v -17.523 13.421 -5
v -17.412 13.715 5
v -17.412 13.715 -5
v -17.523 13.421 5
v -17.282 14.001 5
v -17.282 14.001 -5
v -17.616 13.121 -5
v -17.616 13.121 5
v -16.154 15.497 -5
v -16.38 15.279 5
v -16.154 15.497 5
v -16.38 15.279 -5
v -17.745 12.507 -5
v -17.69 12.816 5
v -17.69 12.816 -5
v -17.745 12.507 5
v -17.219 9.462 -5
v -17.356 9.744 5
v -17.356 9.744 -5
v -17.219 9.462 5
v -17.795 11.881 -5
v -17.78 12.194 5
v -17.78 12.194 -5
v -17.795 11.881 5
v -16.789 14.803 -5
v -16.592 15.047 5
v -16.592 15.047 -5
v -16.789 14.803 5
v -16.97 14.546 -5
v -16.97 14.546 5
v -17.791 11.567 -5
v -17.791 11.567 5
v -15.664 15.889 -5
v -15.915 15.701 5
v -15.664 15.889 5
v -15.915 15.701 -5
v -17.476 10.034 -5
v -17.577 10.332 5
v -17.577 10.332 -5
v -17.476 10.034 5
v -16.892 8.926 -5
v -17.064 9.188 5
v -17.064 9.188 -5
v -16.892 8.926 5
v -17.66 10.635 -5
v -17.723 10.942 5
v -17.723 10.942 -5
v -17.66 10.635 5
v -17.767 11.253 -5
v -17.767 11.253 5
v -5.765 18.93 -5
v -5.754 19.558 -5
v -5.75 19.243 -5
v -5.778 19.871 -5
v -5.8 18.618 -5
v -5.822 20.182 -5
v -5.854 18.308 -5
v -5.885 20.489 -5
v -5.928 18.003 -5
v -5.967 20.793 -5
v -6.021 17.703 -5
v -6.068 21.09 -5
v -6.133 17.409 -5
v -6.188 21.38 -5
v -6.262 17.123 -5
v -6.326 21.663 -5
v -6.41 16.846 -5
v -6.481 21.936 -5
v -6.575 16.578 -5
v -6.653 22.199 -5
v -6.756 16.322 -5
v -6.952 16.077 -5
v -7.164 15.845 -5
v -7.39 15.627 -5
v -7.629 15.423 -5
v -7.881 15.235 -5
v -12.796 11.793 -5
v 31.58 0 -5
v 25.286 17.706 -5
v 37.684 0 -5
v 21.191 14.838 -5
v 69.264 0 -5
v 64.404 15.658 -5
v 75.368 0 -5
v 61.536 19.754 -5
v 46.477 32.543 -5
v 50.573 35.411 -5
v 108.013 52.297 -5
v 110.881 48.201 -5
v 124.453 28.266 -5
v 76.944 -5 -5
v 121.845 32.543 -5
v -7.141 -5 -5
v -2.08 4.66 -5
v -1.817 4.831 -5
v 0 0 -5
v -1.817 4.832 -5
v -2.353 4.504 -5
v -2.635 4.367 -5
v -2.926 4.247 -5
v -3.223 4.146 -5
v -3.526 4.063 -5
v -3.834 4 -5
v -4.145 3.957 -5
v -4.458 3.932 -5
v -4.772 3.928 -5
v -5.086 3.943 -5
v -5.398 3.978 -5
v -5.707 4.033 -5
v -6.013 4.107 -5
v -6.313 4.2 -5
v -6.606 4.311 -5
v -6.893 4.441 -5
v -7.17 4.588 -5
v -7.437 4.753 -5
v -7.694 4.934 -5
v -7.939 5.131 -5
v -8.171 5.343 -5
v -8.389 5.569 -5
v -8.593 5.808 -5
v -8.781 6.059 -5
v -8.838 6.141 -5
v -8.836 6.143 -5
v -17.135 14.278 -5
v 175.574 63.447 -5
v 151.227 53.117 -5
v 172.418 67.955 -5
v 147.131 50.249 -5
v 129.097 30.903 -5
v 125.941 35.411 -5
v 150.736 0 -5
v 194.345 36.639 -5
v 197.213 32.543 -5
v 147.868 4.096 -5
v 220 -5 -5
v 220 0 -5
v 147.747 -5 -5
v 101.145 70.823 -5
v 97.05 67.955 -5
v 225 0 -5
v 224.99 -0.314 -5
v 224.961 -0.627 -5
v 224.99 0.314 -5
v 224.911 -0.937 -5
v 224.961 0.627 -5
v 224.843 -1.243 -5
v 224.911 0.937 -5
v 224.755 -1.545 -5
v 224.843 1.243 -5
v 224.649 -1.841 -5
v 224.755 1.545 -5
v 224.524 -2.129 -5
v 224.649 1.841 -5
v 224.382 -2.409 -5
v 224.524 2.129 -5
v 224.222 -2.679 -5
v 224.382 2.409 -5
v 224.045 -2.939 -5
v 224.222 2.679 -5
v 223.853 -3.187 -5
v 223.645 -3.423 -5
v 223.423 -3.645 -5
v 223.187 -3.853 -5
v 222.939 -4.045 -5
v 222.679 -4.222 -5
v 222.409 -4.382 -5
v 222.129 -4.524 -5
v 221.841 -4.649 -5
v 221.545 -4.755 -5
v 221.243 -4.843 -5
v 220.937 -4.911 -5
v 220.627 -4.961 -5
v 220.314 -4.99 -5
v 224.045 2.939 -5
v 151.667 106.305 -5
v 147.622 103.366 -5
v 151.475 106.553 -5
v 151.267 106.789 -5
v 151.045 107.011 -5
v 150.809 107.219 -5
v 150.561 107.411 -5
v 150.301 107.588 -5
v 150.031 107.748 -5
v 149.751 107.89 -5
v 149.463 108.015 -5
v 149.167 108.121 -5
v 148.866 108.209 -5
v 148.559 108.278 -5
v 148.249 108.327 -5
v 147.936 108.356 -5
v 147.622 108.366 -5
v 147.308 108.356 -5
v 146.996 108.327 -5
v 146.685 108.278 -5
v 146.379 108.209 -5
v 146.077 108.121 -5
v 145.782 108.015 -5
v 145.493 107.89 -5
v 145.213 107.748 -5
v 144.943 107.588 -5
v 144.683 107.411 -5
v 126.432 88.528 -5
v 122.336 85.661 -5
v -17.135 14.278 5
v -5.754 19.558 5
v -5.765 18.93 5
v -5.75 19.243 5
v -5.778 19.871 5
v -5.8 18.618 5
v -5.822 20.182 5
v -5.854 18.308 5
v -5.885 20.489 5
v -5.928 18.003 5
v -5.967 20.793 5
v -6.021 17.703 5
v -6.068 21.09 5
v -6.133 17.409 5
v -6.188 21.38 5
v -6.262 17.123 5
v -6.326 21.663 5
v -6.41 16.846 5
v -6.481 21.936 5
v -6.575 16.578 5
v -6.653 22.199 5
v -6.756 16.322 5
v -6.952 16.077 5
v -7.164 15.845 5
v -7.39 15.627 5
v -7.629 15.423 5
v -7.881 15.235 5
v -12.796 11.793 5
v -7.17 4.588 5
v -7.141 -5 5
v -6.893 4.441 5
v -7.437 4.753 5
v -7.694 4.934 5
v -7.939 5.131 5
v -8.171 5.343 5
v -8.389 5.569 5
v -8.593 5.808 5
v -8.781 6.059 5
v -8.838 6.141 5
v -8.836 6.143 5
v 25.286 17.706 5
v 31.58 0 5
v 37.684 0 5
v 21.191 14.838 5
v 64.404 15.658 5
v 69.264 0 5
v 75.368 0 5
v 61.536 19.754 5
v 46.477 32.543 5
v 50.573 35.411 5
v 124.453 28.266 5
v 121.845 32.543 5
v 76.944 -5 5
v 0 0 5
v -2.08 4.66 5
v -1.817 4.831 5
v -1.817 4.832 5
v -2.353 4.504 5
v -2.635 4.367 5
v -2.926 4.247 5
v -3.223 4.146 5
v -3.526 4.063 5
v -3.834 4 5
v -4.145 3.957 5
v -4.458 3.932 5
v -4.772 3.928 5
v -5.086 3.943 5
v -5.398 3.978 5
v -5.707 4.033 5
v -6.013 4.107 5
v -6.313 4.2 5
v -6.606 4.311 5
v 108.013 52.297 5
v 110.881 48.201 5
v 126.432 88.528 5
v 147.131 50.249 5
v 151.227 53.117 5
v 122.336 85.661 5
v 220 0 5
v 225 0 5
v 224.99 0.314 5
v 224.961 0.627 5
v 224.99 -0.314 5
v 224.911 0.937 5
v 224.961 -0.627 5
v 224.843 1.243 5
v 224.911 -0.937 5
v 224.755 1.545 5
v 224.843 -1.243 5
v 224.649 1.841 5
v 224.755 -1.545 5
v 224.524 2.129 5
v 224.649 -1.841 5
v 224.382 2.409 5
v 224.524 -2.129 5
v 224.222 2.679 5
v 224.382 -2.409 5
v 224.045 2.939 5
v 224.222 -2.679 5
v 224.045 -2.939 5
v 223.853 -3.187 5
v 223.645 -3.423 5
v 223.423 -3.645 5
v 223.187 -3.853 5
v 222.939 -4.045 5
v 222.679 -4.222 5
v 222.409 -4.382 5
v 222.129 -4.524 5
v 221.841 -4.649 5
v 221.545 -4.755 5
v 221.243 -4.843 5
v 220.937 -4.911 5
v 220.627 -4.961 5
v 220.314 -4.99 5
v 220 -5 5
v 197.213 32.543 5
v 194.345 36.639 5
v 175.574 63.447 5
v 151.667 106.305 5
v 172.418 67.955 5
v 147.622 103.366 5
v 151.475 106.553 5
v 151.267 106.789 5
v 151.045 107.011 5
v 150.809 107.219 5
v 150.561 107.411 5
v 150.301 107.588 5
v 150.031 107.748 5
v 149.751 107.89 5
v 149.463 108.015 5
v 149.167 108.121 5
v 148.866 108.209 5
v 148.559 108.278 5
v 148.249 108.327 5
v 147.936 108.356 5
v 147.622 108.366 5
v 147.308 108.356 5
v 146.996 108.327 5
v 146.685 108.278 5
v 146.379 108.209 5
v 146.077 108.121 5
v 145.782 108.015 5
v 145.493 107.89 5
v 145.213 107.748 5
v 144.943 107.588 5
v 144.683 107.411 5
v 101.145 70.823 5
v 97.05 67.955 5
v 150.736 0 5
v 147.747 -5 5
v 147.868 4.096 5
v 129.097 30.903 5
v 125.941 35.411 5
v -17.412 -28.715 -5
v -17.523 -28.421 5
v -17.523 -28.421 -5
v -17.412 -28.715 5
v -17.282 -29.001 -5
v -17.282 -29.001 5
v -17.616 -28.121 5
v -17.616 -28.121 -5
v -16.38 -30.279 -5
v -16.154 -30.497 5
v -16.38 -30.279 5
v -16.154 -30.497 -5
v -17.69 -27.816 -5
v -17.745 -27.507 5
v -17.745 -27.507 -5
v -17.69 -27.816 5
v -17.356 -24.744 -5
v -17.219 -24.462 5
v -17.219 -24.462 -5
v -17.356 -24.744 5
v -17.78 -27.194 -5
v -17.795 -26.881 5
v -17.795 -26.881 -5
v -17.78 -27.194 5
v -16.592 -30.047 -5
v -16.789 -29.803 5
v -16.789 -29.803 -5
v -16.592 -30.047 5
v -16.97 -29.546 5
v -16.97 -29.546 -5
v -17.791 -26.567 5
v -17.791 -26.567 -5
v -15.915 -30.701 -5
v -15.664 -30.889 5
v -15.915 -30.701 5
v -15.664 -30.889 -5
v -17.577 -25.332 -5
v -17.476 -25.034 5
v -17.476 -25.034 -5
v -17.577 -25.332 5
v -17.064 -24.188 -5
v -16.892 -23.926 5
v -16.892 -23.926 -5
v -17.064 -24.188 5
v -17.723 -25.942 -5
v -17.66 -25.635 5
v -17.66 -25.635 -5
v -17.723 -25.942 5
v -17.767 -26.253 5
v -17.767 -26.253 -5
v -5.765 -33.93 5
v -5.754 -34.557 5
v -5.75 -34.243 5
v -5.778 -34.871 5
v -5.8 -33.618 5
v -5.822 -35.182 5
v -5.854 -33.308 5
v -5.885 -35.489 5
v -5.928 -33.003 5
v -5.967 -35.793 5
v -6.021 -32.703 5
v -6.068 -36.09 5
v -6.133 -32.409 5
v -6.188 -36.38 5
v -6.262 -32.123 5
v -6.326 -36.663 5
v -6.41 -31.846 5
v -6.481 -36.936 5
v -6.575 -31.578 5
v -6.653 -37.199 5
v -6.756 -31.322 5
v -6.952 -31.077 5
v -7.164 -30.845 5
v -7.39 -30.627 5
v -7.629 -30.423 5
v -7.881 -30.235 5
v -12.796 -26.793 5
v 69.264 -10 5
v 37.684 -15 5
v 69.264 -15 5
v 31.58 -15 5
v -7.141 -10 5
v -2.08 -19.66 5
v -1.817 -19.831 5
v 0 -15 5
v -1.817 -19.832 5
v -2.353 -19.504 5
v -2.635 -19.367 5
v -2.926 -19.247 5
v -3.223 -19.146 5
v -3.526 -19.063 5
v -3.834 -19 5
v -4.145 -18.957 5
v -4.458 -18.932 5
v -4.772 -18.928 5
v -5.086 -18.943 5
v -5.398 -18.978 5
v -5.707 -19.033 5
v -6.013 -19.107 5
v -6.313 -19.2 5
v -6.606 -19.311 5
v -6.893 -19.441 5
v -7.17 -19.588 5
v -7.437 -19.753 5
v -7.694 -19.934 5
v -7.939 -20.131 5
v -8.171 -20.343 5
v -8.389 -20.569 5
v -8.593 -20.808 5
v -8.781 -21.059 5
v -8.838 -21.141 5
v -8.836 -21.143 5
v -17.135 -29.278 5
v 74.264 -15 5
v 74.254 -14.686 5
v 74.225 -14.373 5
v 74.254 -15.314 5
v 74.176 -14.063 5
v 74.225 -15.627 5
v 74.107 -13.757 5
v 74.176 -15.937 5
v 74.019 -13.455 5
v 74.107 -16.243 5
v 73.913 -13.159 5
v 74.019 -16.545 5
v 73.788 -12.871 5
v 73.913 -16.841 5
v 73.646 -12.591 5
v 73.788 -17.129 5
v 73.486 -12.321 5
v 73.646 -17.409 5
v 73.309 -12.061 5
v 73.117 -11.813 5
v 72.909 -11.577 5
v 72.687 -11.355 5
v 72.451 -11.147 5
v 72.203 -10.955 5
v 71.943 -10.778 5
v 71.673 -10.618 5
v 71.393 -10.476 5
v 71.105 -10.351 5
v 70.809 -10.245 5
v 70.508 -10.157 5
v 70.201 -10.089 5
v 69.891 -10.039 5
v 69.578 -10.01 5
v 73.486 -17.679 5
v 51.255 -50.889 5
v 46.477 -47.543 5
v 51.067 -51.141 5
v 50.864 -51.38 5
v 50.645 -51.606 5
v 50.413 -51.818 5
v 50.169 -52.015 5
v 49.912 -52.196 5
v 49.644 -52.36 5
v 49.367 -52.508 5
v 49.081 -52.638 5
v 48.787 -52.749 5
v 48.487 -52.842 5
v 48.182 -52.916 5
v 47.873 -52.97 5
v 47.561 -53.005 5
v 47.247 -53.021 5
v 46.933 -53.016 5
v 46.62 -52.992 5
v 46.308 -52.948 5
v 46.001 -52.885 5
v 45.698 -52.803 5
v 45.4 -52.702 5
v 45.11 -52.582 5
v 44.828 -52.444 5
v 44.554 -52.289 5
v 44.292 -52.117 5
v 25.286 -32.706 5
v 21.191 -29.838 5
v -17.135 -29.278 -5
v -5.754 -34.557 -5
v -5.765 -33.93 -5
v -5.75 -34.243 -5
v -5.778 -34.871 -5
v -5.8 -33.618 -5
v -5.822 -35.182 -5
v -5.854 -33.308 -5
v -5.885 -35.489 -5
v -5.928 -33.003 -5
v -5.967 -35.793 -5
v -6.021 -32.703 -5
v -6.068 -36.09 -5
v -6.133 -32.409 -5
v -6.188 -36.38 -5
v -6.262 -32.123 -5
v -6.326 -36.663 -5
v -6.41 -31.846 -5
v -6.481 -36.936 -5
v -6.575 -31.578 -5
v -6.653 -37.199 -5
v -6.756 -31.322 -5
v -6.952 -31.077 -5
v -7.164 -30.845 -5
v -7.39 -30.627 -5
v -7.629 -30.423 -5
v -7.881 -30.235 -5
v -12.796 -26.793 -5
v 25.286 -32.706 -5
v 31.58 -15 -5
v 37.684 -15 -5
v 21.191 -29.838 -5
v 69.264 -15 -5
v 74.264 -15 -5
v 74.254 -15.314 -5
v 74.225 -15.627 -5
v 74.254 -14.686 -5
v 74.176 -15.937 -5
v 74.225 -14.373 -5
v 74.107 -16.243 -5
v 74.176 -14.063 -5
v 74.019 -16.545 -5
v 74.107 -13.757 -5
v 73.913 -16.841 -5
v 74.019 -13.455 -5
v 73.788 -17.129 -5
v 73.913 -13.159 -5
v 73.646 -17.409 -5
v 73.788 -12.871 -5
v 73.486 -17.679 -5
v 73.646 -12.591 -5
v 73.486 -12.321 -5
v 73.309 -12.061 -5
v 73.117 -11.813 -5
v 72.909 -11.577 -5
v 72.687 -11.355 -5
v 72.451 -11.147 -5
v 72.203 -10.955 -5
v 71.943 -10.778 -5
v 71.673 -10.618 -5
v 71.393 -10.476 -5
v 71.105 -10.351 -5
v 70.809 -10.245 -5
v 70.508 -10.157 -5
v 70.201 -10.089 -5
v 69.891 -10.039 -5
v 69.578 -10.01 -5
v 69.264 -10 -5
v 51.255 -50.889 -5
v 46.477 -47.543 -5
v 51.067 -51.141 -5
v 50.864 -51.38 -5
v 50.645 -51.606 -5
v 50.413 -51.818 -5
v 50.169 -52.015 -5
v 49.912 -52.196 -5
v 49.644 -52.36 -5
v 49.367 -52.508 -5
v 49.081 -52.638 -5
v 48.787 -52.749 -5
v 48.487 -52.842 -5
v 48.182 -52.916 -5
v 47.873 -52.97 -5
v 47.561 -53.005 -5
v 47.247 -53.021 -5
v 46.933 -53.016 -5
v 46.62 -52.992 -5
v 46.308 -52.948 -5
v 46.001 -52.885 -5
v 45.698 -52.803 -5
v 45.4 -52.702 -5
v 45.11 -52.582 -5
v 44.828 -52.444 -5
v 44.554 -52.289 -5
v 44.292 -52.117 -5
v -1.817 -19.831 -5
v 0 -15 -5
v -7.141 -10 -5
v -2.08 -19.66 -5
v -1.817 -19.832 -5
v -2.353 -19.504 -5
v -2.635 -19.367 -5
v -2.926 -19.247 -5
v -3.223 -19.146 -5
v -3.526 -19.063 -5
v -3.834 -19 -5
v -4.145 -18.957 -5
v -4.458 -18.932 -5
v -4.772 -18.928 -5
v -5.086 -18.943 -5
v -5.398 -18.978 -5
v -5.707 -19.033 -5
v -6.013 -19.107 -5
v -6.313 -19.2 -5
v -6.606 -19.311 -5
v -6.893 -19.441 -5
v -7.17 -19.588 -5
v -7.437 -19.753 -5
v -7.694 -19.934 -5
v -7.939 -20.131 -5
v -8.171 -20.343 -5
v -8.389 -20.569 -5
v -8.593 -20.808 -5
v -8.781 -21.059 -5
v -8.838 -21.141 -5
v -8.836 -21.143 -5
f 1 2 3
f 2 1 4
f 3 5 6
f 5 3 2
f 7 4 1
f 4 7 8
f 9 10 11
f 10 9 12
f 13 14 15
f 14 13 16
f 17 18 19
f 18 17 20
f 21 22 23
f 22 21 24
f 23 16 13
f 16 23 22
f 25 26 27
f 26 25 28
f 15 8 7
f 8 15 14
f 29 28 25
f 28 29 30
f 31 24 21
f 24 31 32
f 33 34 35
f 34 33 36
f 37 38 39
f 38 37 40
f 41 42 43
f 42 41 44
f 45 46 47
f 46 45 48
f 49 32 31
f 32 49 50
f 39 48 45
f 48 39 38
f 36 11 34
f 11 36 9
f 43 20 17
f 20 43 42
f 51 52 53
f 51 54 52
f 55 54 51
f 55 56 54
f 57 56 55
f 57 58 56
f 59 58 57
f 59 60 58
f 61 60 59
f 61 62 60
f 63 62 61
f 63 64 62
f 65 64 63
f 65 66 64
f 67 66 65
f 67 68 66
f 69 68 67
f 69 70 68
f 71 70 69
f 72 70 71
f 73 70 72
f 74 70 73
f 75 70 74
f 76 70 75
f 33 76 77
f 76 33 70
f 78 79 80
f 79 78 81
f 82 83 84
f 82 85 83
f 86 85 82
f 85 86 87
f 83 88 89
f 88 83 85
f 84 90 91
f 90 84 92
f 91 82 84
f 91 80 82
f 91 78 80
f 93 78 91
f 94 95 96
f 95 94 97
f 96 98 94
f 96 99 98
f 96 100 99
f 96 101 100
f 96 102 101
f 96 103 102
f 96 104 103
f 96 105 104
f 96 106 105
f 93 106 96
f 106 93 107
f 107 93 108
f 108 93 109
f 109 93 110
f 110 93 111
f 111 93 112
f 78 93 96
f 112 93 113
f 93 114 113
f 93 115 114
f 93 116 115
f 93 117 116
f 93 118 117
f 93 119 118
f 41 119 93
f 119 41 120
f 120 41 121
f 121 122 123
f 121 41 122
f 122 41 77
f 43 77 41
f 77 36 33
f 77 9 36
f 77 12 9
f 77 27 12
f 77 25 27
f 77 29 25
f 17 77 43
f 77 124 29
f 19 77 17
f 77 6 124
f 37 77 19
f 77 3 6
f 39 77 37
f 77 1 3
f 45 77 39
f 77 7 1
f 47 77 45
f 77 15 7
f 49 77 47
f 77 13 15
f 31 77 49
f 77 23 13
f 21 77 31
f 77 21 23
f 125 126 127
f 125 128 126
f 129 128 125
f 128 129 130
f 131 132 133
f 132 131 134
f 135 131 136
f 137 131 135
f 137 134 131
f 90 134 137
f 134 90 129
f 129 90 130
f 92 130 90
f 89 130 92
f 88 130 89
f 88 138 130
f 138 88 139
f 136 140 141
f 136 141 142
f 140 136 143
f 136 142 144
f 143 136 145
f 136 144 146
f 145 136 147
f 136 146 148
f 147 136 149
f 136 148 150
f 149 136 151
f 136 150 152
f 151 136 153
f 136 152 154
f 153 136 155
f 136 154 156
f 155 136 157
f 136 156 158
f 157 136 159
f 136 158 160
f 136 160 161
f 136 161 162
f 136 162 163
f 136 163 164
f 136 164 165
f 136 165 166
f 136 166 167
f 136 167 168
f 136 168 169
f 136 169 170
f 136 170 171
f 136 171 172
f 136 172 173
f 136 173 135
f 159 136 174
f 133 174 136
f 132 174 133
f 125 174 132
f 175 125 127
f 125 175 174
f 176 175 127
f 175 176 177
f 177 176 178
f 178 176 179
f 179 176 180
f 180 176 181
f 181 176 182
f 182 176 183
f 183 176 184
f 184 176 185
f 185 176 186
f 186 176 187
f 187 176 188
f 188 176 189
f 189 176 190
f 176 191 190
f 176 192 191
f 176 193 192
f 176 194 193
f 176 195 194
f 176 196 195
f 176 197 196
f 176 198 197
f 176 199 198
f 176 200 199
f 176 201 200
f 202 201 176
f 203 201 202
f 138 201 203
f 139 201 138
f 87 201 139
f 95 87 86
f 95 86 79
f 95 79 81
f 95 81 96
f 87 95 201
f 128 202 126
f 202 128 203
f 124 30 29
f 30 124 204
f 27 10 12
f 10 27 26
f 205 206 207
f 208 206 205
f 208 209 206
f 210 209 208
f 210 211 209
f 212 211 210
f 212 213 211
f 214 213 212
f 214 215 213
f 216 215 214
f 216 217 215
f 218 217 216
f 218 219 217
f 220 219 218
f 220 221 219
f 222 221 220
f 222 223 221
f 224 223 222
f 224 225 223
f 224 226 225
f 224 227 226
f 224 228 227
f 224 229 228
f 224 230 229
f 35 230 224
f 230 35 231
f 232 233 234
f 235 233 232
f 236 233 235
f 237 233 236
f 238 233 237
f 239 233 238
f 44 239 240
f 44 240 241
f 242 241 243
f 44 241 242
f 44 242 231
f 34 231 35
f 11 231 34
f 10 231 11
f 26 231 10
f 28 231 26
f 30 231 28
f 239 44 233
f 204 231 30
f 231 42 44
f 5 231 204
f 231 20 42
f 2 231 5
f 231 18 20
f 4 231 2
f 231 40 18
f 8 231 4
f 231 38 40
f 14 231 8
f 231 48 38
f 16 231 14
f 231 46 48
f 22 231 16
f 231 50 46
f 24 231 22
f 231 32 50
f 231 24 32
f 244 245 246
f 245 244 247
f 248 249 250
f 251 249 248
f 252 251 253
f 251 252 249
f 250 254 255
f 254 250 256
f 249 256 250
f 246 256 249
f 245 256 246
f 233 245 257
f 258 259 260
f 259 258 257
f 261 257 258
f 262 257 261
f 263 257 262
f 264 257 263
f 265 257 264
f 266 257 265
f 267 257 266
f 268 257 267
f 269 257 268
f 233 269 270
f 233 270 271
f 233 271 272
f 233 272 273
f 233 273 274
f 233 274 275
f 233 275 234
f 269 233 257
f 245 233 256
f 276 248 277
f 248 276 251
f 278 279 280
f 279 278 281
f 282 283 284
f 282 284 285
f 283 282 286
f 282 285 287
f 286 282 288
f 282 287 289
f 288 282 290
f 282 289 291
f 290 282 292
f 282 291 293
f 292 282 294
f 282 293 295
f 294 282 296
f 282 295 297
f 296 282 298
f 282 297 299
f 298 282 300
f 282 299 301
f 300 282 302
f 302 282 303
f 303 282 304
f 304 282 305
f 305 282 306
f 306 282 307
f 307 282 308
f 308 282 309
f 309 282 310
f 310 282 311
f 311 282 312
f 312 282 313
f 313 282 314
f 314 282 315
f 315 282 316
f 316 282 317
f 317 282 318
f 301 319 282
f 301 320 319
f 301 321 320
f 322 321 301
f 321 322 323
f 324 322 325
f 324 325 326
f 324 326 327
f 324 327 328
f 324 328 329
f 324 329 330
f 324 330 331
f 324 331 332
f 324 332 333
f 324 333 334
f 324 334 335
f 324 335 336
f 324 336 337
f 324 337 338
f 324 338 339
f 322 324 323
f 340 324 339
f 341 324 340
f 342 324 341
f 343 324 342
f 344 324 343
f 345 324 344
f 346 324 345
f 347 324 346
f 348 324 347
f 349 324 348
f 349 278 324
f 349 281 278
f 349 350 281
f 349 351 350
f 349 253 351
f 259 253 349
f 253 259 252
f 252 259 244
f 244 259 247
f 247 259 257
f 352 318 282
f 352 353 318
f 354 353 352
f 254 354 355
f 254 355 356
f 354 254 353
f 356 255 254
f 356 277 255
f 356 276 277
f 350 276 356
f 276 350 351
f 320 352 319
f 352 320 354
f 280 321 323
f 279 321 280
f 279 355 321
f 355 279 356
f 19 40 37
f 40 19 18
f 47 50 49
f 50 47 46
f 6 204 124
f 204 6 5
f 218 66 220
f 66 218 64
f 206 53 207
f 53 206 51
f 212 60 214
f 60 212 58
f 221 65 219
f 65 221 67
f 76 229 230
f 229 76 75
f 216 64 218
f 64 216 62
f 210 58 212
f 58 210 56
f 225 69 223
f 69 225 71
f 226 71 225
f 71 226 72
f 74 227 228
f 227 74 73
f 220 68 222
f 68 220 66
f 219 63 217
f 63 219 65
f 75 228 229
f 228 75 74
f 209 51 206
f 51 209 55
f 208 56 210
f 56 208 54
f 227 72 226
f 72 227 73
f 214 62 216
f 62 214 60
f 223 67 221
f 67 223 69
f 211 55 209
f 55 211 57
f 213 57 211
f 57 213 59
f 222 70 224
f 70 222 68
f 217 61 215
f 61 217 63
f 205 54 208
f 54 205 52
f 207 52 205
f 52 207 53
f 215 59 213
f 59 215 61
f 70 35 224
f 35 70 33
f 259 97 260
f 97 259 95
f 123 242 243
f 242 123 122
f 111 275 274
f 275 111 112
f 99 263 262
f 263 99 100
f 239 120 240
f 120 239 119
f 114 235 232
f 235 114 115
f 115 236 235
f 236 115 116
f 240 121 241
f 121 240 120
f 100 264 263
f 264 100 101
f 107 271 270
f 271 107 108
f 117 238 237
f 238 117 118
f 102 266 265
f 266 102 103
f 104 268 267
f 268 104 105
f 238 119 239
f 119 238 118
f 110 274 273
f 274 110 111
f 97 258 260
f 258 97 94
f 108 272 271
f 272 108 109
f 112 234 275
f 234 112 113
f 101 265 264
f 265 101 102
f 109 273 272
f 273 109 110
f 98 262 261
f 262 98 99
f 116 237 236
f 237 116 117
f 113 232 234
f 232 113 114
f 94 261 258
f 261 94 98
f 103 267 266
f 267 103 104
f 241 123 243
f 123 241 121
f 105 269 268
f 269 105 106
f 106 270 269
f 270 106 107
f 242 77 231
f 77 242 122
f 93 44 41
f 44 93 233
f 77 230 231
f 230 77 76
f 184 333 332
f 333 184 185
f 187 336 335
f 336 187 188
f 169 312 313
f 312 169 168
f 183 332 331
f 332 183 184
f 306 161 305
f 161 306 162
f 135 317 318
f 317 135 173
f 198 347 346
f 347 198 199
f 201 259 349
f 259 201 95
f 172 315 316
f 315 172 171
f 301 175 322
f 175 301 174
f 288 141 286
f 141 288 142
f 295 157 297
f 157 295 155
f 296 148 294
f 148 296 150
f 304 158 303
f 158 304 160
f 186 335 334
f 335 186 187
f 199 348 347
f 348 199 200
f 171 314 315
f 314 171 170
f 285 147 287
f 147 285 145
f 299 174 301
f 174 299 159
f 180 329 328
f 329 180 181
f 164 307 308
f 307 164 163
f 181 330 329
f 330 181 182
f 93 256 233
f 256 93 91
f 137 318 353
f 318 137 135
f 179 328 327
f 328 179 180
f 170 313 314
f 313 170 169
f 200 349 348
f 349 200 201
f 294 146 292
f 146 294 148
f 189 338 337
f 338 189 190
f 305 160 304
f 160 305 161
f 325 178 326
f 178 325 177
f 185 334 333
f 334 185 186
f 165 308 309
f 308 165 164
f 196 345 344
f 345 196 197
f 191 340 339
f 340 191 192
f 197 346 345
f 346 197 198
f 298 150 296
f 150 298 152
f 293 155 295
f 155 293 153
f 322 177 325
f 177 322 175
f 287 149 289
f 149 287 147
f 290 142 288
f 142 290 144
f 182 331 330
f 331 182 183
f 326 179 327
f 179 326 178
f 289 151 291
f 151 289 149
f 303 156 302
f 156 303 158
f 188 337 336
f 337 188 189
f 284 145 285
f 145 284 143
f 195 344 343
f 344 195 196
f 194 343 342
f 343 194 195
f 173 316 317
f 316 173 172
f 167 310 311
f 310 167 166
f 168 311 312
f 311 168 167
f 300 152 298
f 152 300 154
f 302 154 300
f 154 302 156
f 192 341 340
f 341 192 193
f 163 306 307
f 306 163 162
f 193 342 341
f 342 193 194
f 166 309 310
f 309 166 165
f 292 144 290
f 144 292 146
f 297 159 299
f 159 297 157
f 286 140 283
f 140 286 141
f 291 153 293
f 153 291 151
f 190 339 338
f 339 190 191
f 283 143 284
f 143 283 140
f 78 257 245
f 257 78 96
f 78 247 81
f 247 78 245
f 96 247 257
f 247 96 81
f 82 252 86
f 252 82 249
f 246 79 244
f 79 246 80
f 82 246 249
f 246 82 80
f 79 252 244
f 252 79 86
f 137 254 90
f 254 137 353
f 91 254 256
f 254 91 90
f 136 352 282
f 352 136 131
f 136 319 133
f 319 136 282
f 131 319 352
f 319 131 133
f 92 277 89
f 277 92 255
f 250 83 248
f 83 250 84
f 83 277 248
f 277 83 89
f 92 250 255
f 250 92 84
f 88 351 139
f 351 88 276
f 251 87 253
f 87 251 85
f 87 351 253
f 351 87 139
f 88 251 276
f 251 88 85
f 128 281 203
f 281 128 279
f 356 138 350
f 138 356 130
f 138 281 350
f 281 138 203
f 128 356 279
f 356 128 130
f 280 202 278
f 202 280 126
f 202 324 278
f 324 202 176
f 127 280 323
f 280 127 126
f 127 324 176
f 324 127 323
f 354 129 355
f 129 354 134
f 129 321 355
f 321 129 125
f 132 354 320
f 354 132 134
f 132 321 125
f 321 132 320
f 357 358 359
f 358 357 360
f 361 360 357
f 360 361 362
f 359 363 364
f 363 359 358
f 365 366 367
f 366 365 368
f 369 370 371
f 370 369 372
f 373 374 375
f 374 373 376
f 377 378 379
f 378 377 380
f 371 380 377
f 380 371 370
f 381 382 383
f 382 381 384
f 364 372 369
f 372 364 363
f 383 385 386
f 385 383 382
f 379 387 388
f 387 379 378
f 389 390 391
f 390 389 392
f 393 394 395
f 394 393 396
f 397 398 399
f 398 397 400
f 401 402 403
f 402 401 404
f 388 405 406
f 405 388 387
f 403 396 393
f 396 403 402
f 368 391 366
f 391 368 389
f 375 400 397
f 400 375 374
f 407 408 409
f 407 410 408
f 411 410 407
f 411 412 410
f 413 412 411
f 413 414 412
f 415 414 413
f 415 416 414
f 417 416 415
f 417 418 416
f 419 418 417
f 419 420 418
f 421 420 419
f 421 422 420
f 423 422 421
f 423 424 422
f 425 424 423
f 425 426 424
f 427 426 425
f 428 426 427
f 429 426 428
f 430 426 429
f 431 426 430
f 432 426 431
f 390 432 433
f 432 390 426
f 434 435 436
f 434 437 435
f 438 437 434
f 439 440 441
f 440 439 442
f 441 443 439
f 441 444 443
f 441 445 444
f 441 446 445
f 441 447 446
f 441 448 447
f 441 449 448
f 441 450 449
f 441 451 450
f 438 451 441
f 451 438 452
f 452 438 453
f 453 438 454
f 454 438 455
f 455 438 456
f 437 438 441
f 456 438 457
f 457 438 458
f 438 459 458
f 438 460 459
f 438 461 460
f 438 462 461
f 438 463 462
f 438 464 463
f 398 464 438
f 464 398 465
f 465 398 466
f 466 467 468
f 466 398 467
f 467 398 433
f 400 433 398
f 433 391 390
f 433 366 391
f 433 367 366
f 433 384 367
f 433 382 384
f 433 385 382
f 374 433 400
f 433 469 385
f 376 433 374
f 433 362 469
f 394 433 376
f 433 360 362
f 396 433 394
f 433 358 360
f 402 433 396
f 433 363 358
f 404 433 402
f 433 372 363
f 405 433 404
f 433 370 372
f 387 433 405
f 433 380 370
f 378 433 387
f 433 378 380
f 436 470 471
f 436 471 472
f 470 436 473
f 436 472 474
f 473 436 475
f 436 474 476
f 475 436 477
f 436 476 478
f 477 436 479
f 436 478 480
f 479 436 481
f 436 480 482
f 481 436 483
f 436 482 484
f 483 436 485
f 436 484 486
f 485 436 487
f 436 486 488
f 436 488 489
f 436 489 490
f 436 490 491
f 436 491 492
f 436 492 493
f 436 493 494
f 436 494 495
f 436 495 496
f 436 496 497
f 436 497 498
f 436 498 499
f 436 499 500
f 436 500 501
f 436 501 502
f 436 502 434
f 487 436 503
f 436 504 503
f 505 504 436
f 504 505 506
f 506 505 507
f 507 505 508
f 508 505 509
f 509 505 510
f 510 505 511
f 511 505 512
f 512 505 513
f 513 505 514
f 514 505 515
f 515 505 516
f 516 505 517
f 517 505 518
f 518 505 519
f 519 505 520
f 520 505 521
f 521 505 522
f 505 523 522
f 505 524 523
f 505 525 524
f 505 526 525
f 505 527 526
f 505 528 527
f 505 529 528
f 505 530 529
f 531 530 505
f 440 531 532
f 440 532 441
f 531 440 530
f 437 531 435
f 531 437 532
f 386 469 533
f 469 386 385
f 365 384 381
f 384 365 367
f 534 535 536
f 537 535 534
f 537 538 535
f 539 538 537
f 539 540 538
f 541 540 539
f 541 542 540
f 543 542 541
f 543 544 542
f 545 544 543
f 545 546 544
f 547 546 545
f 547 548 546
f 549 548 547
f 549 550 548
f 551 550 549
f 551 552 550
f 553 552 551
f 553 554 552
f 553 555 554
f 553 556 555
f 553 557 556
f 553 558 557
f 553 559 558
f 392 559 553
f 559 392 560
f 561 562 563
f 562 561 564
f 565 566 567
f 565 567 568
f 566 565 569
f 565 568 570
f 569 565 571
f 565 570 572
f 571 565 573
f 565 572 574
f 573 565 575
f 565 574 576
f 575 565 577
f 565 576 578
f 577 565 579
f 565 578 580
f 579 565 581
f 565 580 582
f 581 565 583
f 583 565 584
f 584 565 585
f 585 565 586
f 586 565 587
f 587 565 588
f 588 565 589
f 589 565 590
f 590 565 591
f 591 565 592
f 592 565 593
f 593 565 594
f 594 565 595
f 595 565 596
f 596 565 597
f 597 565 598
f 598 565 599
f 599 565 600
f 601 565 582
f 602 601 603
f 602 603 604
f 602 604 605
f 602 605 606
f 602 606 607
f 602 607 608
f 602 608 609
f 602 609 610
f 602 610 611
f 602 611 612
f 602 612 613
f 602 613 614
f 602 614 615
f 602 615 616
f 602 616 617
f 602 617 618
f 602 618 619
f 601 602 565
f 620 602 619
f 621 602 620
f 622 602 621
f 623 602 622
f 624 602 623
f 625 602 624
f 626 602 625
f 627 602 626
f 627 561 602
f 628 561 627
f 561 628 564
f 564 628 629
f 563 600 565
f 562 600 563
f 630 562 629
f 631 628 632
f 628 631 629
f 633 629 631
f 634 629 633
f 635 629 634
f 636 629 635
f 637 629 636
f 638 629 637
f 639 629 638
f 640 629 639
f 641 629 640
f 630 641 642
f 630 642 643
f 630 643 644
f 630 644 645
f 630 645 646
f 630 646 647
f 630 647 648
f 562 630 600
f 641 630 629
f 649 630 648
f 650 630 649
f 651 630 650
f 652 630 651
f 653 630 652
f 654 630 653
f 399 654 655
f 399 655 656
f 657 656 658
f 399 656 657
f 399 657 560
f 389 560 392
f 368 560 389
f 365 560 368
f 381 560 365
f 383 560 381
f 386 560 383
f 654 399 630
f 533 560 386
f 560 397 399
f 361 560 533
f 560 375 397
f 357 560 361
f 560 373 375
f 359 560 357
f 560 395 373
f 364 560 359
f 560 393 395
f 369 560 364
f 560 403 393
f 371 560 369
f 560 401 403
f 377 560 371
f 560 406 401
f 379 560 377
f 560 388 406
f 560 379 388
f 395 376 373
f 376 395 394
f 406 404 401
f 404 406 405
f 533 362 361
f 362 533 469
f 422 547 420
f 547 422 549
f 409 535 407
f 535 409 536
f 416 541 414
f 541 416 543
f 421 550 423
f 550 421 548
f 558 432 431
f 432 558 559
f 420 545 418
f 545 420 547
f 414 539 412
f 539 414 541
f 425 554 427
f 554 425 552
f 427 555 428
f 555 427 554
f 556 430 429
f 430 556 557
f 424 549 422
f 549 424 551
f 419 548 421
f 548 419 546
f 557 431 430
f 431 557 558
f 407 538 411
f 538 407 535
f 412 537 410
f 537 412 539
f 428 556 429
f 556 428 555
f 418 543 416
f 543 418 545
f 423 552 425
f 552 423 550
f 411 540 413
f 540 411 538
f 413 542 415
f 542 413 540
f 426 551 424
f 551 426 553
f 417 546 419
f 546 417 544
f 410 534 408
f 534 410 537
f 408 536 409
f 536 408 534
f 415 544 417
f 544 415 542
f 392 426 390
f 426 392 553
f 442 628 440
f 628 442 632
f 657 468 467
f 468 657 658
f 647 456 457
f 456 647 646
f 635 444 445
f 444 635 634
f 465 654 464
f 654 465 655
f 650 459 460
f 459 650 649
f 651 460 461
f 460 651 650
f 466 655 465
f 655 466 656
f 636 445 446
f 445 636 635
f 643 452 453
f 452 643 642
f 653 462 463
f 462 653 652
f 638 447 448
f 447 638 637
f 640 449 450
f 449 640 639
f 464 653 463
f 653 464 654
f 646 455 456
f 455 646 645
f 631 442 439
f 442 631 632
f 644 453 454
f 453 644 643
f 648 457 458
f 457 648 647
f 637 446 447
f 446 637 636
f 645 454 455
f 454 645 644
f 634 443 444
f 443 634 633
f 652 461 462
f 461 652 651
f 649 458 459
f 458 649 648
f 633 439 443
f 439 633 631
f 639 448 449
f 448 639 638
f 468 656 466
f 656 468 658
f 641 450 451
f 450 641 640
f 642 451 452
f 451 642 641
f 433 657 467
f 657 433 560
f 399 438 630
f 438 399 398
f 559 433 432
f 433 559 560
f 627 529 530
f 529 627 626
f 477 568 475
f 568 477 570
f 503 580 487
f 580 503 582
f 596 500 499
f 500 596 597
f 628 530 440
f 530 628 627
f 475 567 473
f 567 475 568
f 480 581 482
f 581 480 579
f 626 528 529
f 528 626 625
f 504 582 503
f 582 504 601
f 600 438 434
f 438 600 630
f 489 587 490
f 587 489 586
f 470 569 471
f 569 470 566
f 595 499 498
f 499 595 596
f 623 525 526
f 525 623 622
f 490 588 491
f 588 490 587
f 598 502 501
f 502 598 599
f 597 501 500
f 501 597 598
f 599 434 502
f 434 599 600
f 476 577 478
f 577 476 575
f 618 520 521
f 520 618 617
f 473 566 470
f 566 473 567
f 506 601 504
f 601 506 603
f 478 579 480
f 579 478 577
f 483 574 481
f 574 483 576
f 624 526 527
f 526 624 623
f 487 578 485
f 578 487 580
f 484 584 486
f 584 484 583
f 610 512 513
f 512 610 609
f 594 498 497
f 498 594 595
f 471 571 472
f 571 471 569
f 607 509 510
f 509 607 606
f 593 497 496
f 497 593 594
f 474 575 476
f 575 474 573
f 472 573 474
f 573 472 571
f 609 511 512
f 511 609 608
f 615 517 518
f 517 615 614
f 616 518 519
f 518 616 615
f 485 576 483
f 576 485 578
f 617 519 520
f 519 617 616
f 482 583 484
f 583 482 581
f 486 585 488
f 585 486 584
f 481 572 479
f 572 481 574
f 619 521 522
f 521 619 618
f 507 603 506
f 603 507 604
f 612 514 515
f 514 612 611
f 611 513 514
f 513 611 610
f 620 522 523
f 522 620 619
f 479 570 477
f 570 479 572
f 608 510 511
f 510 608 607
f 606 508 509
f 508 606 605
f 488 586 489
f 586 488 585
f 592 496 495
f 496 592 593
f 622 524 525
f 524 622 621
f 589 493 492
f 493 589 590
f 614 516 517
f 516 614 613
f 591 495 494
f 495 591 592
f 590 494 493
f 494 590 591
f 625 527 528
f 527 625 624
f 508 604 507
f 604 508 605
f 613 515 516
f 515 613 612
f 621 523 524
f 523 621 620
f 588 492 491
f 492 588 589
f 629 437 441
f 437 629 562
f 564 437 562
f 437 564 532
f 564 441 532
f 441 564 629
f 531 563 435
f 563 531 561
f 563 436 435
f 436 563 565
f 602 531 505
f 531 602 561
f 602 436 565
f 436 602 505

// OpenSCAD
//resolution
$fn=100;

//Wall thickness (mm)
wallThick = 5;  // [2:8]

//Angle (Deg)
angleDeg = 35;  // [15:50]

//Deepnes of the base(mm)
baseDeep = 220; // 

//Width of the Stand(mm)
standWidth = 10;// [2:20]

//Spacing of the Hook(mm)
hookSpace = 12; // [5:20]

// Length of the Hook(mm). Zero = No Hook
hookLen = 6;   // [30]

/* [Hidden] */
fudge = 0.1;    //0.1

subDivs = 6;

surfaceLen = cos(angleDeg) * baseDeep;

topXCord = pow(surfaceLen,2)/baseDeep;
topYCord = sqrt((baseDeep-topXCord)*topXCord);

fieldWdth = (surfaceLen-(subDivs-1)*wallThick)/subDivs;
echo(surfaceLen,fieldWdth);
echo(norm([ 144.02, 100.45, 5.00 ]));

// triangle calculations
// tan alpha = GK/AK
// cos alpha = AK/HYP
// sin alpha = GK/HYP
// b²=c*q
// a²+b²=c²
dFieldWdth = fieldWdth*2+wallThick; //double field width (adjactence side)
GK = tan(angleDeg)*fieldWdth; //opposite width of triangle to remove

dGK = tan(angleDeg)* dFieldWdth; //opposite width of the large triangle
dAK = dFieldWdth;
dHYP = dGK / sin(angleDeg); //hypotenuse width of large triangle

HYP1 = sqrt(pow(fieldWdth,2)+pow(GK,2)); //The hypotenuse of the triangle to remove
HYP2 = wallThick / cos(angleDeg);  //the hypotenuse of the small wall base, width to next triangle
GK2 = sqrt(pow(HYP2,2)-pow(wallThick,2)); //opposite width of the small tri at the base f the wall
GK3 = sin(angleDeg)*wallThick; //opposite width of small tri at the rightmost triangle
AK3 = cos(angleDeg)*wallThick;

GK4 = wallThick-AK3+fudge; //very small Tri at opener
HYP4 = GK4/sin(angleDeg);
AK4 = cos(angleDeg) * HYP4;

AK5 = GK4;
HYP5 = AK5/cos(angleDeg);

Hg = sin(angleDeg)*dFieldWdth;
q = Hg+wallThick/tan(angleDeg);
echo(GK3);
    

//base geometry
//big one
difference(){
union(){
    hull(){
        cylinder(h=standWidth,r=wallThick, center=true);
        translate ([baseDeep,0,0]) 
            cylinder(h=standWidth,r=wallThick, center=true);
        translate ([topXCord,topYCord,0]) 
            cylinder(h=standWidth,r=wallThick, center=true);
    }

    //get translation for the hook in X dir
    AK=wallThick/tan(angleDeg);

    translate([-AK,-wallThick,-standWidth/2])
        rotate([0,0,angleDeg])       
            hook();
    translate([-AK,-wallThick,-standWidth/2]) 
        cube([AK,wallThick,standWidth]);
}


// now the recesses 
//polys
    //#1
    rotate([0,0,angleDeg]) linear_extrude(height=standWidth+fudge,center=true) polygon([[0,0],[fieldWdth,0],[fieldWdth,-GK]]);
    //#2 (tri+quad)
    translate ([HYP1+HYP2,0,0]) 
        rotate([0,0,angleDeg]) 
        linear_extrude(height=standWidth+fudge,center=true) 
            polygon([[0,0],[0,GK+GK2],[fieldWdth,GK+GK2],[fieldWdth,0],[fieldWdth,-GK]]);
    //#3 (double, opens at bottom)
    //#translate ([(HYP1+HYP2)*2+GK3,-AK3,0]) 
    translate ([(HYP1+HYP2)*2+GK3-AK4,-wallThick-fudge,0]) 
        rotate([0,0,angleDeg]) 
        linear_extrude(height=standWidth+fudge,center=true) 
            polygon([[0,0],[dFieldWdth+AK4,0],[dFieldWdth+AK4,-dGK-HYP5]]);

    //#4 (double)
    translate ([(HYP1+HYP2)*4,0,0]) rotate([0,0,angleDeg]) 
        linear_extrude(height=standWidth+fudge,center=true) 
            polygon([[0,0],[dFieldWdth,0],[dFieldWdth,-dGK]]);
            
//now the rectangles
    recDepth2=2*(GK+GK2);
    //#1
    translate([(HYP1+HYP2)*2,0,-(standWidth+fudge)/2])
        rotate([0,0,angleDeg]) cube([dFieldWdth,(recDepth2-wallThick)/2,standWidth+fudge]);
    //#2
    translate([(HYP1+HYP2)*2,0,-(standWidth+fudge)/2])
        rotate([0,0,angleDeg]) 
            translate([0,(recDepth2-wallThick)/2+wallThick,0])cube([dFieldWdth,(recDepth2-wallThick)/2,standWidth+fudge]);
    //#3
    translate([(HYP1+HYP2)*4,0,-(standWidth+fudge)/2])rotate([0,0,angleDeg]) 
        translate([0,dGK+GK2,0])cube([fieldWdth,recDepth2,standWidth+fudge]);
        
 
    //#4
    translate([(HYP1+HYP2)*5,0,-(standWidth+fudge)/2])rotate([0,0,angleDeg]) 
        translate([0,dGK+GK2+GK+GK2,0])cube([fieldWdth,recDepth2,standWidth+fudge,]);
        
    //#5
    translate([(HYP1+HYP2)*4-GK3,AK3,-(standWidth+fudge)/2]) rotate([0,0,angleDeg]) 
        translate([0,0,0])cube([fieldWdth*2+wallThick,2*GK-GK2,standWidth+fudge,]);
   
    
}
// the small one
translate([0,-wallThick*3,0])
rotate([180,0,0])
    difference(){
        union(){
            hull(){
                cylinder(h=standWidth,r=wallThick, center=true);
                translate ([2*HYP1+HYP2,0,0]) 
                    cylinder(h=standWidth,r=wallThick, center=true);
                rotate([0,0,angleDeg])
                translate ([surfaceLen*(2/subDivs)-wallThick/2,0,0]) 
                    cylinder(h=standWidth,r=wallThick, center=true);
            }

            //get translation for the hook in X dir
            AK=wallThick/tan(angleDeg);

            translate([-AK,-wallThick,-standWidth/2])
                rotate([0,0,angleDeg])       
                    hook();
            translate([-AK,-wallThick,-standWidth/2]) 
                cube([AK,wallThick,standWidth]);
        }
        //#1
        rotate([0,0,angleDeg]) linear_extrude(height=standWidth+fudge,center=true) polygon([[0,0],[fieldWdth,0],[fieldWdth,-GK]]);
        
        //#2 (tri+quad)
        translate ([HYP1+HYP2,0,0]) 
            rotate([0,0,angleDeg]) 
            linear_extrude(height=standWidth+fudge,center=true) 
                polygon([[0,0],[0,GK+GK2],[fieldWdth,GK+GK2],[fieldWdth,0],[fieldWdth,-GK]]);
    }


module hook(){

    union(){
        cube([wallThick,hookSpace+wallThick,standWidth]);
        translate([wallThick,hookSpace+wallThick,0])
            intersection(){
                cylinder(h=standWidth,r=wallThick, center=false);
                translate([-wallThick-fudge,0,-fudge/2]) cube([wallThick+fudge,wallThick+fudge,standWidth+fudge]);
            }
        if (hookLen) translate([wallThick,hookSpace+wallThick,0]) cube([hookLen,wallThick,standWidth]);
        if (hookLen) translate([wallThick+hookLen,hookSpace+wallThick*2,0]) 
            intersection(){
            cylinder(h=standWidth,r=wallThick, center=false);
                translate([0,-wallThick-fudge,-fudge/2]) cube([wallThick+fudge,wallThick+fudge,standWidth+fudge]);
            }
        translate([wallThick*2,2*wallThick,0]) 
            difference(){
                translate([-wallThick-fudge,-2*wallThick,0]) cube([wallThick+fudge,2*wallThick+fudge,standWidth]);
                translate([0,0,-fudge/2]) cylinder(h=standWidth+fudge,r=wallThick, center=false);
            }
    }
}
